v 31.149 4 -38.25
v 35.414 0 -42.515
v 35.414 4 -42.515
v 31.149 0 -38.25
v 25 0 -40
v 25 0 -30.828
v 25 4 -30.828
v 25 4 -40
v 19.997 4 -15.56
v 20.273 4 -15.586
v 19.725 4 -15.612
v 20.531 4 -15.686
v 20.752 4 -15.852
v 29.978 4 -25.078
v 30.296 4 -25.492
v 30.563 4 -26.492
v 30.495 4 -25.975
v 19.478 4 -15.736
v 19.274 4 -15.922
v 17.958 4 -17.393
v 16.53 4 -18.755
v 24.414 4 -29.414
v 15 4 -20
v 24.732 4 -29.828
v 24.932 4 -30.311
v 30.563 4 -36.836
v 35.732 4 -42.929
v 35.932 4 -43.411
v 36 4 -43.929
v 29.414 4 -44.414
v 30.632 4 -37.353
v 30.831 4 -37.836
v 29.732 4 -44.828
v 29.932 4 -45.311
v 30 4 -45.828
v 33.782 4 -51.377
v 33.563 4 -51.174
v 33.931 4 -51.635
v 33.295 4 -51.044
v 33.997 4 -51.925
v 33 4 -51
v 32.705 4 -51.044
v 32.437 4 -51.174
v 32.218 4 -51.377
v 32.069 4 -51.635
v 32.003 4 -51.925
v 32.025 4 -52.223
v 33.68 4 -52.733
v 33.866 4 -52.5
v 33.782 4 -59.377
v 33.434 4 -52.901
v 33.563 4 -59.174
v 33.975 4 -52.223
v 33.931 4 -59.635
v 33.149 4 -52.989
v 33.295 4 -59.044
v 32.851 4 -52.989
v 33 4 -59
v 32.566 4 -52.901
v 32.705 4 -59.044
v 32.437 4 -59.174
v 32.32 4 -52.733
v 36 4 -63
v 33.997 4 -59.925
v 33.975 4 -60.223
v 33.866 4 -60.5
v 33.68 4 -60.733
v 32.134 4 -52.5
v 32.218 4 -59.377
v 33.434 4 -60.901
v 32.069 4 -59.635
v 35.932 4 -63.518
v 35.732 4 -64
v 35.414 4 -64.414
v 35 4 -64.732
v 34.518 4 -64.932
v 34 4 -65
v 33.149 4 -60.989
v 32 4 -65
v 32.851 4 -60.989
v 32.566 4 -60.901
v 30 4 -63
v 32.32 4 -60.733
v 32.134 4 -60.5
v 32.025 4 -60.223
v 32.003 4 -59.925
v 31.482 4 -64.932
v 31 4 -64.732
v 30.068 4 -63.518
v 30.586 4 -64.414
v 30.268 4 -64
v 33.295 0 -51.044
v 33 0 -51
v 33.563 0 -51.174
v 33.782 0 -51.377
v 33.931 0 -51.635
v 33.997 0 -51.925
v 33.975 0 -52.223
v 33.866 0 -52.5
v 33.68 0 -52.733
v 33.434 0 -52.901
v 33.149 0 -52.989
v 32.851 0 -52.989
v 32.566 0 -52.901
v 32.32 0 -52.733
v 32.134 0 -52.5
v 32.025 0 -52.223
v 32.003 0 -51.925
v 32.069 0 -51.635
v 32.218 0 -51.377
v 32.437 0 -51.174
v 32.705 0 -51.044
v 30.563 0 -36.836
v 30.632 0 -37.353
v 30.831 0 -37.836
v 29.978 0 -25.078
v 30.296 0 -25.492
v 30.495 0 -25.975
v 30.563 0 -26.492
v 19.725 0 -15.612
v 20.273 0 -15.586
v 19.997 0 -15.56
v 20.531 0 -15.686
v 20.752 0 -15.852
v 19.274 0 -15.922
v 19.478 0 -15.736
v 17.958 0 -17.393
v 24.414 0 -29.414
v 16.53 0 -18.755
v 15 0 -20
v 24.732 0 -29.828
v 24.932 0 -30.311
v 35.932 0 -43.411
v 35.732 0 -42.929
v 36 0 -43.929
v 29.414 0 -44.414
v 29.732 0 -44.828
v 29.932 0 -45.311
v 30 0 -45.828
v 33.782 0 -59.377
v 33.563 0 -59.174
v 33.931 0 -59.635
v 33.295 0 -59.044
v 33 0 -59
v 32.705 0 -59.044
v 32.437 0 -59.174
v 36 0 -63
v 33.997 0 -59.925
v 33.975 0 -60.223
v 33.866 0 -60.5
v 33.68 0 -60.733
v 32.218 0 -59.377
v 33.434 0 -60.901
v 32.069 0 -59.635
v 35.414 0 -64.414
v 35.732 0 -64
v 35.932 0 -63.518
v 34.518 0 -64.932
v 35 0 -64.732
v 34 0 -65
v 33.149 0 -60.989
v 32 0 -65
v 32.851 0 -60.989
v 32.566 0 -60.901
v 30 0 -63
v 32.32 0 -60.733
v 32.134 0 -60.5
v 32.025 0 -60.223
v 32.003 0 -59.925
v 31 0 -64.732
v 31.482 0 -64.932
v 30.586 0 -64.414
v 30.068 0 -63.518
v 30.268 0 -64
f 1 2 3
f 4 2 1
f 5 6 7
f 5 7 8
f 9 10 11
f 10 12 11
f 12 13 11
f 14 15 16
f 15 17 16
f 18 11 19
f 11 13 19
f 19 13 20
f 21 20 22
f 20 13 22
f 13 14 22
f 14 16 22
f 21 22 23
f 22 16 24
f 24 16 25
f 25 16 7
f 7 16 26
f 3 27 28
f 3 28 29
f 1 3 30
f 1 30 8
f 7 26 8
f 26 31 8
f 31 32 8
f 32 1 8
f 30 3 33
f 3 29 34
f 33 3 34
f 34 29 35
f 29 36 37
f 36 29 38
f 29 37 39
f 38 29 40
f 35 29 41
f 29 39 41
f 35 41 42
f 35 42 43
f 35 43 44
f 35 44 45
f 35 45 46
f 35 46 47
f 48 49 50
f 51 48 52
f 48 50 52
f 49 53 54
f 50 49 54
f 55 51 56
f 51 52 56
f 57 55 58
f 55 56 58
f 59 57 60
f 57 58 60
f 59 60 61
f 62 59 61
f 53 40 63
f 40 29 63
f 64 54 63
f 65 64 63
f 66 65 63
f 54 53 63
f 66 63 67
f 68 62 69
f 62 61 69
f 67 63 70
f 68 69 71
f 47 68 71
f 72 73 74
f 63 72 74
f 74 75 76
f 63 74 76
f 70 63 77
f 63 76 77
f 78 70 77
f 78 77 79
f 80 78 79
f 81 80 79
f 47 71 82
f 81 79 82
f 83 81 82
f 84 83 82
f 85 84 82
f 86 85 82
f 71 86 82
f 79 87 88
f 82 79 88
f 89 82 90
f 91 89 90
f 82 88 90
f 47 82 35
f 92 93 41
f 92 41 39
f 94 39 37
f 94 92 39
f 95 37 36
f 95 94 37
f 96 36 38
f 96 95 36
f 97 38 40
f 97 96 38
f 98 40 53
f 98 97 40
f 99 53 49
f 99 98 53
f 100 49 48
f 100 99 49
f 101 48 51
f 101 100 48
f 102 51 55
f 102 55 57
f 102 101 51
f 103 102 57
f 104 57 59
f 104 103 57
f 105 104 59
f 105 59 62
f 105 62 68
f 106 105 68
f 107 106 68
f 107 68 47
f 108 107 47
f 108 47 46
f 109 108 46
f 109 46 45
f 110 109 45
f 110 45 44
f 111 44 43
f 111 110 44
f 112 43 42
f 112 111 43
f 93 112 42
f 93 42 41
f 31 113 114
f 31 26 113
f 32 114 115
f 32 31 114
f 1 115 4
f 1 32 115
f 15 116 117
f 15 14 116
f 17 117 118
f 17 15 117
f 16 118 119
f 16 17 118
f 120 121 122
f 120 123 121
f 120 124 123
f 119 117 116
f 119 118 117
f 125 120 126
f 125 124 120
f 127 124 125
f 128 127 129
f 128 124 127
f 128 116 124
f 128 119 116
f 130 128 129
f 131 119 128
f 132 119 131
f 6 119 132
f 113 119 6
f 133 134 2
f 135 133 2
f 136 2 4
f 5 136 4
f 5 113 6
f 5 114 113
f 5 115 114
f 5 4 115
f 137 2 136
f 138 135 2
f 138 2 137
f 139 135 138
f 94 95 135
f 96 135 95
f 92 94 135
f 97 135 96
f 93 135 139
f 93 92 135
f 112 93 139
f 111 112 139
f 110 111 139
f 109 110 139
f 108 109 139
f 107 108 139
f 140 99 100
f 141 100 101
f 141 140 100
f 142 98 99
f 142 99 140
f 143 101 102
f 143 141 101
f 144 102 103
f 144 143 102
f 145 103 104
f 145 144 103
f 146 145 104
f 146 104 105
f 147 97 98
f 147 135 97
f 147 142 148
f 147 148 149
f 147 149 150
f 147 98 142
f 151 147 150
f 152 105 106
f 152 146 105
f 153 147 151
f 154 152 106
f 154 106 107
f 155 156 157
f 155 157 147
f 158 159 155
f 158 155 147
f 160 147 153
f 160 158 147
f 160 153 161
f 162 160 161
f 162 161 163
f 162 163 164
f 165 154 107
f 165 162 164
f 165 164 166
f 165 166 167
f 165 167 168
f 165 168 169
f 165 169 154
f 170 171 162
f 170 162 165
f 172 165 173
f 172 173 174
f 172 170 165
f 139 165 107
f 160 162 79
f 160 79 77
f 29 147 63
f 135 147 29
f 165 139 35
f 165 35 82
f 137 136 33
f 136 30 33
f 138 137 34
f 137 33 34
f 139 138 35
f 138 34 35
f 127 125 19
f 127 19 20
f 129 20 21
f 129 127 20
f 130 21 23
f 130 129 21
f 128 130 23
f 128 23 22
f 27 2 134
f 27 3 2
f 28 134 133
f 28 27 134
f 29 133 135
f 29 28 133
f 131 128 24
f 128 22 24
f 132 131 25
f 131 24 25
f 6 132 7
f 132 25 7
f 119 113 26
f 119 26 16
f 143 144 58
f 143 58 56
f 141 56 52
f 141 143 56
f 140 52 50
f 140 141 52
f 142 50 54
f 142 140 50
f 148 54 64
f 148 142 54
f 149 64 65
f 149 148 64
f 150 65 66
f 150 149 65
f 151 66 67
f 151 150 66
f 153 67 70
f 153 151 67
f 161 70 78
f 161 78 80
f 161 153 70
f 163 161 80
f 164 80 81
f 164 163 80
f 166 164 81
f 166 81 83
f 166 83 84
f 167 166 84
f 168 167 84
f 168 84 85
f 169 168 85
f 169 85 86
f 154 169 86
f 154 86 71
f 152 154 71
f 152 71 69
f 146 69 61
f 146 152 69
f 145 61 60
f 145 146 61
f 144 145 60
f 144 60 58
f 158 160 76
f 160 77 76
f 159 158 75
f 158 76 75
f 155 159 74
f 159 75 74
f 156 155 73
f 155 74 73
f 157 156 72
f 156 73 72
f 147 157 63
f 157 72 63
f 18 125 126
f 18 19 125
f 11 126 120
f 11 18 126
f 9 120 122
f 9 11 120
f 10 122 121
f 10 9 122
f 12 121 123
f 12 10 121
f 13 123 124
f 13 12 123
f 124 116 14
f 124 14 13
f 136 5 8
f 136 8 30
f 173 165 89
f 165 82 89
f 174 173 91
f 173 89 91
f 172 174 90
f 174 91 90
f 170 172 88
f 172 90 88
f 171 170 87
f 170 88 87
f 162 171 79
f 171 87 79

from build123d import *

# Parameters (mm, degrees)
SKETCH_1_R      = 1
EXTRUDE_1_DEPTH = 4
FILLET_1_R      = 2
FILLET_2_R      = 1


with BuildPart() as part:
    # 草图1 → 凸台-拉伸1 (new body)
    with BuildSketch(Plane(origin=(0, 0, 0), x_dir=(1, 0, 0), z_dir=(0, 1, 0))):
        with BuildLine():
            Line((15, 20), (25, 30))
            Line((25, 30), (25, 40))
            Line((25, 40), (30, 45))
            Line((30, 45), (30, 65))
            Line((30, 65), (36, 65))
            Line((36, 65), (36, 43.100505063))
            Line((36, 43.100505063), (30.563454525, 37.663959588))
            Line((30.563454525, 37.663959588), (30.563454525, 25.663959588))
            Line((30.563454525, 25.663959588), (19.956852807, 15.05735787))
            ThreePointArc((19.956852807, 15.05735787), (17.652275132, 17.7030275), (15, 20))
        make_face()
        with Locations(Location((33, 60, 0), (0, 0, 270))):
            Circle(SKETCH_1_R, mode=Mode.SUBTRACT)
        with Locations(Location((33, 52, 0), (0, 0, 270))):
            Circle(SKETCH_1_R, mode=Mode.SUBTRACT)
    extrude(amount=EXTRUDE_1_DEPTH)

    # 圆角1
    fillet_1_edges = [part.edges().sort_by_distance(p)[0] for p in [
        (30, 2, -45),
        (30, 2, -65),
        (36, 2, -65),
        (36, 2, -43.100505063),
        (30.563454525, 2, -37.663959588),
        (30.563454525, 2, -25.663959588),
        (25, 2, -30),
    ]]
    fillet(fillet_1_edges, radius=FILLET_1_R)

    # 圆角2
    fillet_2_edges = [part.edges().sort_by_distance(p)[0] for p in [
        (19.956852807, 2, -15.05735787),
    ]]
    fillet(fillet_2_edges, radius=FILLET_2_R)


solid = part.part
